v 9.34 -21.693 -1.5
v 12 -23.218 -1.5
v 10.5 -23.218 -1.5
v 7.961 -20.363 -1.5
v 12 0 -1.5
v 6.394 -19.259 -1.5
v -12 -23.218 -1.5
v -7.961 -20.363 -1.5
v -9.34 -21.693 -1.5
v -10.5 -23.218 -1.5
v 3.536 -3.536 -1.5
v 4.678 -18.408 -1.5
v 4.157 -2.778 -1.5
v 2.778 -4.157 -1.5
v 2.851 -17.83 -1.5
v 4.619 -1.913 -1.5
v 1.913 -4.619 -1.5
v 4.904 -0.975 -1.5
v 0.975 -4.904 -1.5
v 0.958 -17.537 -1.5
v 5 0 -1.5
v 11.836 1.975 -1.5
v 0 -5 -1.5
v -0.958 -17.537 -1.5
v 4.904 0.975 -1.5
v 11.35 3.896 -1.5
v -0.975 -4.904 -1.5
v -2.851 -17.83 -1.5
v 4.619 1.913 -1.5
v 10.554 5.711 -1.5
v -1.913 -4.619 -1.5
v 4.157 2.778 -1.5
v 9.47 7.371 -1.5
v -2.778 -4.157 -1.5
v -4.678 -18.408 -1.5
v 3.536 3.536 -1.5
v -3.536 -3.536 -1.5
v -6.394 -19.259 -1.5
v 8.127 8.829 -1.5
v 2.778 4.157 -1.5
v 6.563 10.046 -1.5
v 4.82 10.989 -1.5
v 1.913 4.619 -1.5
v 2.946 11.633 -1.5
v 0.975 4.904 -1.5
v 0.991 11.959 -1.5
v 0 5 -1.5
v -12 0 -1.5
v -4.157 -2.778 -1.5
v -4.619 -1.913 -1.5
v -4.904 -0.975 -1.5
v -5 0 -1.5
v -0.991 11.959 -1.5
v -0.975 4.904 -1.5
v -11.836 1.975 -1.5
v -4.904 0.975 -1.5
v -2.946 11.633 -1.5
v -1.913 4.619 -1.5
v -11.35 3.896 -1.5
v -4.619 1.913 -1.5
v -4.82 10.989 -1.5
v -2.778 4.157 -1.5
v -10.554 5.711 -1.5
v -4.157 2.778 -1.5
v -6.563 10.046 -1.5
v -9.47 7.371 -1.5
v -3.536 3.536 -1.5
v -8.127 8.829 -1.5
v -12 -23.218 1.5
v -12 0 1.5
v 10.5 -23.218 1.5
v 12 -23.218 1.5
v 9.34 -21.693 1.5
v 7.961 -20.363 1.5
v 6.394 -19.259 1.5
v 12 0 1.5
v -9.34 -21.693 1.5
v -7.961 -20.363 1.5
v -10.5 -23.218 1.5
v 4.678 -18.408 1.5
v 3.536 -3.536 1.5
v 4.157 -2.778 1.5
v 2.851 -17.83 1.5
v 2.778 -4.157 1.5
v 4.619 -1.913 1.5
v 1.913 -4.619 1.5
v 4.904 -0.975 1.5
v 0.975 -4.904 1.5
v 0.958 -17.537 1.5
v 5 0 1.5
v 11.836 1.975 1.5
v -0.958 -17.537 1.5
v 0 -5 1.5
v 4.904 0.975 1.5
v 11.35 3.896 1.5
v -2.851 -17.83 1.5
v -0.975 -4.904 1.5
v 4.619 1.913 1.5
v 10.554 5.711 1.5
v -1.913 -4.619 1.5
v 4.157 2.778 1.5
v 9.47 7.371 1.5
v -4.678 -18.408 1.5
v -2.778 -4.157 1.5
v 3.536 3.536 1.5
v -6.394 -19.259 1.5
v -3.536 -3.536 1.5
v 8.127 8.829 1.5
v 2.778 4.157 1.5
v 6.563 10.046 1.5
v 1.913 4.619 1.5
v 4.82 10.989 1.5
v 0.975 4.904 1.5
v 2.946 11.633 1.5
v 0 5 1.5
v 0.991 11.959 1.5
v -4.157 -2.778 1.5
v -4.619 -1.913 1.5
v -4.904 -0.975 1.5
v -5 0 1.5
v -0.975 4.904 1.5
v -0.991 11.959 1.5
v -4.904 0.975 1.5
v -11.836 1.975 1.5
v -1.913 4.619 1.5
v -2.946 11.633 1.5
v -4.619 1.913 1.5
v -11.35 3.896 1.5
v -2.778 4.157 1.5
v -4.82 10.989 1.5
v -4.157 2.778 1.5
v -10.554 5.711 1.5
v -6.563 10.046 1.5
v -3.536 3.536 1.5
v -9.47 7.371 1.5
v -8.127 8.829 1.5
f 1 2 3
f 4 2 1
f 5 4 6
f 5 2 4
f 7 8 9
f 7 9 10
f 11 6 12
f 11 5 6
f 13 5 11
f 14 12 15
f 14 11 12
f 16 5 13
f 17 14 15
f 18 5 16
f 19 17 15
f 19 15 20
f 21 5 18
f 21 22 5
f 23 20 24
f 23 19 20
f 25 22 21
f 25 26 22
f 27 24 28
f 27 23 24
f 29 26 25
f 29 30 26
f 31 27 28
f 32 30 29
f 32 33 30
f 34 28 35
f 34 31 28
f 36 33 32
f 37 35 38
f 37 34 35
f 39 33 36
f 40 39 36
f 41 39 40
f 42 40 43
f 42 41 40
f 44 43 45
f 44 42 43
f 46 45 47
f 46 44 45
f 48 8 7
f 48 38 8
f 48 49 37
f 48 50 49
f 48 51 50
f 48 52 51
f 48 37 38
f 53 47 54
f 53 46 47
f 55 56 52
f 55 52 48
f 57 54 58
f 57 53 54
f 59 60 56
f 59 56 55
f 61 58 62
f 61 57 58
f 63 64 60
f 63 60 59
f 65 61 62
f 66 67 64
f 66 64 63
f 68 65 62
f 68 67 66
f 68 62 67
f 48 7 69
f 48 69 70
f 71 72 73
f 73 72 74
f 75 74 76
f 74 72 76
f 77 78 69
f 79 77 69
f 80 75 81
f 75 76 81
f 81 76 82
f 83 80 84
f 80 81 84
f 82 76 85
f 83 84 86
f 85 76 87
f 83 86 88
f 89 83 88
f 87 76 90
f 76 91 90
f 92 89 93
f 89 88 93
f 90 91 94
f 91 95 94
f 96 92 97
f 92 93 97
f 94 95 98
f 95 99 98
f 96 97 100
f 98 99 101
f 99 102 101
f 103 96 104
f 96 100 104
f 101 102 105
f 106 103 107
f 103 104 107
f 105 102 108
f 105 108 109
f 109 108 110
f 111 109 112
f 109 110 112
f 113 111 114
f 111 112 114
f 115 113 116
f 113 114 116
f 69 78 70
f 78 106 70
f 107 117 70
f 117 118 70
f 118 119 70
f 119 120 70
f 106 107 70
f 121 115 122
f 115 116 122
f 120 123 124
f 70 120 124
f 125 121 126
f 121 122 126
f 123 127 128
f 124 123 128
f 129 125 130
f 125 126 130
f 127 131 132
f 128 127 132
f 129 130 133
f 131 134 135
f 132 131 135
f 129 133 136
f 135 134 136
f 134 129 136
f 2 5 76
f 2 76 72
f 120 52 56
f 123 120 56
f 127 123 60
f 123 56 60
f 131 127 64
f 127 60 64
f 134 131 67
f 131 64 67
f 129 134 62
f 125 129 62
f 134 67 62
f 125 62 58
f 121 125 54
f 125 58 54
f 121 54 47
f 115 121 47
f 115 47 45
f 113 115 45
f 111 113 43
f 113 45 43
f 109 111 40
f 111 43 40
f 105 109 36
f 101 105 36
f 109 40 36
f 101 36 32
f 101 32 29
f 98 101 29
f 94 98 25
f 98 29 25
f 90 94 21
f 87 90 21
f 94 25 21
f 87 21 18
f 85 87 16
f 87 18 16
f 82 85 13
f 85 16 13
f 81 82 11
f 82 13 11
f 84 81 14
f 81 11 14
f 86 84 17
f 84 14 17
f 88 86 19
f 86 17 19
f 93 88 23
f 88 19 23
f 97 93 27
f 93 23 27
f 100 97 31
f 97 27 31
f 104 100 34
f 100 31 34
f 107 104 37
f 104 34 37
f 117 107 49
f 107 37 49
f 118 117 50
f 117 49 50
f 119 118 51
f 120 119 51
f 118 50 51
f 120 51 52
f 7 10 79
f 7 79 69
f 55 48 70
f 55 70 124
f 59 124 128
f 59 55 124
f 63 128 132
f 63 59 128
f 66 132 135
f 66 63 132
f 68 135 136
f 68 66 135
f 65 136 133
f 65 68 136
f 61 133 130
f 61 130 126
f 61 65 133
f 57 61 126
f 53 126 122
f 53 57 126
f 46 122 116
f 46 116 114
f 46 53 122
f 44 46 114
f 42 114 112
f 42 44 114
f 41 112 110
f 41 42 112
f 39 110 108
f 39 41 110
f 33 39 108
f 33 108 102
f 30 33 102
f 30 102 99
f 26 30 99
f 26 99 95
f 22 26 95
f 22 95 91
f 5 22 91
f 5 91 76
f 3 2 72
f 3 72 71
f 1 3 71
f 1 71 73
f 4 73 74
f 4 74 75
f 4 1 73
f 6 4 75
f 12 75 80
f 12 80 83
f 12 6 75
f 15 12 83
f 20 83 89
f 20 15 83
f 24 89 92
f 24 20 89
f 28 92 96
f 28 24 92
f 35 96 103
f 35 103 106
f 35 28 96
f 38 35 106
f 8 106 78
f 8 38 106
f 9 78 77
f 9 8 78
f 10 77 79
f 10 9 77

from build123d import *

# Parameters (mm, degrees)
SZKIC1_R                    = 5
DODANIE_WYCI_GNI_CIE1_DEPTH = 3


with BuildPart() as part:
    # Szkic1 → Dodanie-wyciągnięcie1 (new body)
    with BuildSketch(Plane(origin=(0, 0, -1.5), x_dir=(-1, 0, 0), z_dir=(0, 0, -1))):
        with BuildLine():
            Line((-12, 0), (-12, -23.217670017))
            Line((-12, -23.217670017), (-10.5, -23.217670017))
            ThreePointArc((-10.5, -23.217670017), (0, -17.5), (10.5, -23.217670017))
            Line((10.5, -23.217670017), (12, -23.217670017))
            Line((12, -23.217670017), (12, 0))
            ThreePointArc((12, 0), (0, 12), (-12, 0))
        make_face()
        Circle(SZKIC1_R, mode=Mode.SUBTRACT)
    extrude(amount=-DODANIE_WYCI_GNI_CIE1_DEPTH)


solid = part.part
